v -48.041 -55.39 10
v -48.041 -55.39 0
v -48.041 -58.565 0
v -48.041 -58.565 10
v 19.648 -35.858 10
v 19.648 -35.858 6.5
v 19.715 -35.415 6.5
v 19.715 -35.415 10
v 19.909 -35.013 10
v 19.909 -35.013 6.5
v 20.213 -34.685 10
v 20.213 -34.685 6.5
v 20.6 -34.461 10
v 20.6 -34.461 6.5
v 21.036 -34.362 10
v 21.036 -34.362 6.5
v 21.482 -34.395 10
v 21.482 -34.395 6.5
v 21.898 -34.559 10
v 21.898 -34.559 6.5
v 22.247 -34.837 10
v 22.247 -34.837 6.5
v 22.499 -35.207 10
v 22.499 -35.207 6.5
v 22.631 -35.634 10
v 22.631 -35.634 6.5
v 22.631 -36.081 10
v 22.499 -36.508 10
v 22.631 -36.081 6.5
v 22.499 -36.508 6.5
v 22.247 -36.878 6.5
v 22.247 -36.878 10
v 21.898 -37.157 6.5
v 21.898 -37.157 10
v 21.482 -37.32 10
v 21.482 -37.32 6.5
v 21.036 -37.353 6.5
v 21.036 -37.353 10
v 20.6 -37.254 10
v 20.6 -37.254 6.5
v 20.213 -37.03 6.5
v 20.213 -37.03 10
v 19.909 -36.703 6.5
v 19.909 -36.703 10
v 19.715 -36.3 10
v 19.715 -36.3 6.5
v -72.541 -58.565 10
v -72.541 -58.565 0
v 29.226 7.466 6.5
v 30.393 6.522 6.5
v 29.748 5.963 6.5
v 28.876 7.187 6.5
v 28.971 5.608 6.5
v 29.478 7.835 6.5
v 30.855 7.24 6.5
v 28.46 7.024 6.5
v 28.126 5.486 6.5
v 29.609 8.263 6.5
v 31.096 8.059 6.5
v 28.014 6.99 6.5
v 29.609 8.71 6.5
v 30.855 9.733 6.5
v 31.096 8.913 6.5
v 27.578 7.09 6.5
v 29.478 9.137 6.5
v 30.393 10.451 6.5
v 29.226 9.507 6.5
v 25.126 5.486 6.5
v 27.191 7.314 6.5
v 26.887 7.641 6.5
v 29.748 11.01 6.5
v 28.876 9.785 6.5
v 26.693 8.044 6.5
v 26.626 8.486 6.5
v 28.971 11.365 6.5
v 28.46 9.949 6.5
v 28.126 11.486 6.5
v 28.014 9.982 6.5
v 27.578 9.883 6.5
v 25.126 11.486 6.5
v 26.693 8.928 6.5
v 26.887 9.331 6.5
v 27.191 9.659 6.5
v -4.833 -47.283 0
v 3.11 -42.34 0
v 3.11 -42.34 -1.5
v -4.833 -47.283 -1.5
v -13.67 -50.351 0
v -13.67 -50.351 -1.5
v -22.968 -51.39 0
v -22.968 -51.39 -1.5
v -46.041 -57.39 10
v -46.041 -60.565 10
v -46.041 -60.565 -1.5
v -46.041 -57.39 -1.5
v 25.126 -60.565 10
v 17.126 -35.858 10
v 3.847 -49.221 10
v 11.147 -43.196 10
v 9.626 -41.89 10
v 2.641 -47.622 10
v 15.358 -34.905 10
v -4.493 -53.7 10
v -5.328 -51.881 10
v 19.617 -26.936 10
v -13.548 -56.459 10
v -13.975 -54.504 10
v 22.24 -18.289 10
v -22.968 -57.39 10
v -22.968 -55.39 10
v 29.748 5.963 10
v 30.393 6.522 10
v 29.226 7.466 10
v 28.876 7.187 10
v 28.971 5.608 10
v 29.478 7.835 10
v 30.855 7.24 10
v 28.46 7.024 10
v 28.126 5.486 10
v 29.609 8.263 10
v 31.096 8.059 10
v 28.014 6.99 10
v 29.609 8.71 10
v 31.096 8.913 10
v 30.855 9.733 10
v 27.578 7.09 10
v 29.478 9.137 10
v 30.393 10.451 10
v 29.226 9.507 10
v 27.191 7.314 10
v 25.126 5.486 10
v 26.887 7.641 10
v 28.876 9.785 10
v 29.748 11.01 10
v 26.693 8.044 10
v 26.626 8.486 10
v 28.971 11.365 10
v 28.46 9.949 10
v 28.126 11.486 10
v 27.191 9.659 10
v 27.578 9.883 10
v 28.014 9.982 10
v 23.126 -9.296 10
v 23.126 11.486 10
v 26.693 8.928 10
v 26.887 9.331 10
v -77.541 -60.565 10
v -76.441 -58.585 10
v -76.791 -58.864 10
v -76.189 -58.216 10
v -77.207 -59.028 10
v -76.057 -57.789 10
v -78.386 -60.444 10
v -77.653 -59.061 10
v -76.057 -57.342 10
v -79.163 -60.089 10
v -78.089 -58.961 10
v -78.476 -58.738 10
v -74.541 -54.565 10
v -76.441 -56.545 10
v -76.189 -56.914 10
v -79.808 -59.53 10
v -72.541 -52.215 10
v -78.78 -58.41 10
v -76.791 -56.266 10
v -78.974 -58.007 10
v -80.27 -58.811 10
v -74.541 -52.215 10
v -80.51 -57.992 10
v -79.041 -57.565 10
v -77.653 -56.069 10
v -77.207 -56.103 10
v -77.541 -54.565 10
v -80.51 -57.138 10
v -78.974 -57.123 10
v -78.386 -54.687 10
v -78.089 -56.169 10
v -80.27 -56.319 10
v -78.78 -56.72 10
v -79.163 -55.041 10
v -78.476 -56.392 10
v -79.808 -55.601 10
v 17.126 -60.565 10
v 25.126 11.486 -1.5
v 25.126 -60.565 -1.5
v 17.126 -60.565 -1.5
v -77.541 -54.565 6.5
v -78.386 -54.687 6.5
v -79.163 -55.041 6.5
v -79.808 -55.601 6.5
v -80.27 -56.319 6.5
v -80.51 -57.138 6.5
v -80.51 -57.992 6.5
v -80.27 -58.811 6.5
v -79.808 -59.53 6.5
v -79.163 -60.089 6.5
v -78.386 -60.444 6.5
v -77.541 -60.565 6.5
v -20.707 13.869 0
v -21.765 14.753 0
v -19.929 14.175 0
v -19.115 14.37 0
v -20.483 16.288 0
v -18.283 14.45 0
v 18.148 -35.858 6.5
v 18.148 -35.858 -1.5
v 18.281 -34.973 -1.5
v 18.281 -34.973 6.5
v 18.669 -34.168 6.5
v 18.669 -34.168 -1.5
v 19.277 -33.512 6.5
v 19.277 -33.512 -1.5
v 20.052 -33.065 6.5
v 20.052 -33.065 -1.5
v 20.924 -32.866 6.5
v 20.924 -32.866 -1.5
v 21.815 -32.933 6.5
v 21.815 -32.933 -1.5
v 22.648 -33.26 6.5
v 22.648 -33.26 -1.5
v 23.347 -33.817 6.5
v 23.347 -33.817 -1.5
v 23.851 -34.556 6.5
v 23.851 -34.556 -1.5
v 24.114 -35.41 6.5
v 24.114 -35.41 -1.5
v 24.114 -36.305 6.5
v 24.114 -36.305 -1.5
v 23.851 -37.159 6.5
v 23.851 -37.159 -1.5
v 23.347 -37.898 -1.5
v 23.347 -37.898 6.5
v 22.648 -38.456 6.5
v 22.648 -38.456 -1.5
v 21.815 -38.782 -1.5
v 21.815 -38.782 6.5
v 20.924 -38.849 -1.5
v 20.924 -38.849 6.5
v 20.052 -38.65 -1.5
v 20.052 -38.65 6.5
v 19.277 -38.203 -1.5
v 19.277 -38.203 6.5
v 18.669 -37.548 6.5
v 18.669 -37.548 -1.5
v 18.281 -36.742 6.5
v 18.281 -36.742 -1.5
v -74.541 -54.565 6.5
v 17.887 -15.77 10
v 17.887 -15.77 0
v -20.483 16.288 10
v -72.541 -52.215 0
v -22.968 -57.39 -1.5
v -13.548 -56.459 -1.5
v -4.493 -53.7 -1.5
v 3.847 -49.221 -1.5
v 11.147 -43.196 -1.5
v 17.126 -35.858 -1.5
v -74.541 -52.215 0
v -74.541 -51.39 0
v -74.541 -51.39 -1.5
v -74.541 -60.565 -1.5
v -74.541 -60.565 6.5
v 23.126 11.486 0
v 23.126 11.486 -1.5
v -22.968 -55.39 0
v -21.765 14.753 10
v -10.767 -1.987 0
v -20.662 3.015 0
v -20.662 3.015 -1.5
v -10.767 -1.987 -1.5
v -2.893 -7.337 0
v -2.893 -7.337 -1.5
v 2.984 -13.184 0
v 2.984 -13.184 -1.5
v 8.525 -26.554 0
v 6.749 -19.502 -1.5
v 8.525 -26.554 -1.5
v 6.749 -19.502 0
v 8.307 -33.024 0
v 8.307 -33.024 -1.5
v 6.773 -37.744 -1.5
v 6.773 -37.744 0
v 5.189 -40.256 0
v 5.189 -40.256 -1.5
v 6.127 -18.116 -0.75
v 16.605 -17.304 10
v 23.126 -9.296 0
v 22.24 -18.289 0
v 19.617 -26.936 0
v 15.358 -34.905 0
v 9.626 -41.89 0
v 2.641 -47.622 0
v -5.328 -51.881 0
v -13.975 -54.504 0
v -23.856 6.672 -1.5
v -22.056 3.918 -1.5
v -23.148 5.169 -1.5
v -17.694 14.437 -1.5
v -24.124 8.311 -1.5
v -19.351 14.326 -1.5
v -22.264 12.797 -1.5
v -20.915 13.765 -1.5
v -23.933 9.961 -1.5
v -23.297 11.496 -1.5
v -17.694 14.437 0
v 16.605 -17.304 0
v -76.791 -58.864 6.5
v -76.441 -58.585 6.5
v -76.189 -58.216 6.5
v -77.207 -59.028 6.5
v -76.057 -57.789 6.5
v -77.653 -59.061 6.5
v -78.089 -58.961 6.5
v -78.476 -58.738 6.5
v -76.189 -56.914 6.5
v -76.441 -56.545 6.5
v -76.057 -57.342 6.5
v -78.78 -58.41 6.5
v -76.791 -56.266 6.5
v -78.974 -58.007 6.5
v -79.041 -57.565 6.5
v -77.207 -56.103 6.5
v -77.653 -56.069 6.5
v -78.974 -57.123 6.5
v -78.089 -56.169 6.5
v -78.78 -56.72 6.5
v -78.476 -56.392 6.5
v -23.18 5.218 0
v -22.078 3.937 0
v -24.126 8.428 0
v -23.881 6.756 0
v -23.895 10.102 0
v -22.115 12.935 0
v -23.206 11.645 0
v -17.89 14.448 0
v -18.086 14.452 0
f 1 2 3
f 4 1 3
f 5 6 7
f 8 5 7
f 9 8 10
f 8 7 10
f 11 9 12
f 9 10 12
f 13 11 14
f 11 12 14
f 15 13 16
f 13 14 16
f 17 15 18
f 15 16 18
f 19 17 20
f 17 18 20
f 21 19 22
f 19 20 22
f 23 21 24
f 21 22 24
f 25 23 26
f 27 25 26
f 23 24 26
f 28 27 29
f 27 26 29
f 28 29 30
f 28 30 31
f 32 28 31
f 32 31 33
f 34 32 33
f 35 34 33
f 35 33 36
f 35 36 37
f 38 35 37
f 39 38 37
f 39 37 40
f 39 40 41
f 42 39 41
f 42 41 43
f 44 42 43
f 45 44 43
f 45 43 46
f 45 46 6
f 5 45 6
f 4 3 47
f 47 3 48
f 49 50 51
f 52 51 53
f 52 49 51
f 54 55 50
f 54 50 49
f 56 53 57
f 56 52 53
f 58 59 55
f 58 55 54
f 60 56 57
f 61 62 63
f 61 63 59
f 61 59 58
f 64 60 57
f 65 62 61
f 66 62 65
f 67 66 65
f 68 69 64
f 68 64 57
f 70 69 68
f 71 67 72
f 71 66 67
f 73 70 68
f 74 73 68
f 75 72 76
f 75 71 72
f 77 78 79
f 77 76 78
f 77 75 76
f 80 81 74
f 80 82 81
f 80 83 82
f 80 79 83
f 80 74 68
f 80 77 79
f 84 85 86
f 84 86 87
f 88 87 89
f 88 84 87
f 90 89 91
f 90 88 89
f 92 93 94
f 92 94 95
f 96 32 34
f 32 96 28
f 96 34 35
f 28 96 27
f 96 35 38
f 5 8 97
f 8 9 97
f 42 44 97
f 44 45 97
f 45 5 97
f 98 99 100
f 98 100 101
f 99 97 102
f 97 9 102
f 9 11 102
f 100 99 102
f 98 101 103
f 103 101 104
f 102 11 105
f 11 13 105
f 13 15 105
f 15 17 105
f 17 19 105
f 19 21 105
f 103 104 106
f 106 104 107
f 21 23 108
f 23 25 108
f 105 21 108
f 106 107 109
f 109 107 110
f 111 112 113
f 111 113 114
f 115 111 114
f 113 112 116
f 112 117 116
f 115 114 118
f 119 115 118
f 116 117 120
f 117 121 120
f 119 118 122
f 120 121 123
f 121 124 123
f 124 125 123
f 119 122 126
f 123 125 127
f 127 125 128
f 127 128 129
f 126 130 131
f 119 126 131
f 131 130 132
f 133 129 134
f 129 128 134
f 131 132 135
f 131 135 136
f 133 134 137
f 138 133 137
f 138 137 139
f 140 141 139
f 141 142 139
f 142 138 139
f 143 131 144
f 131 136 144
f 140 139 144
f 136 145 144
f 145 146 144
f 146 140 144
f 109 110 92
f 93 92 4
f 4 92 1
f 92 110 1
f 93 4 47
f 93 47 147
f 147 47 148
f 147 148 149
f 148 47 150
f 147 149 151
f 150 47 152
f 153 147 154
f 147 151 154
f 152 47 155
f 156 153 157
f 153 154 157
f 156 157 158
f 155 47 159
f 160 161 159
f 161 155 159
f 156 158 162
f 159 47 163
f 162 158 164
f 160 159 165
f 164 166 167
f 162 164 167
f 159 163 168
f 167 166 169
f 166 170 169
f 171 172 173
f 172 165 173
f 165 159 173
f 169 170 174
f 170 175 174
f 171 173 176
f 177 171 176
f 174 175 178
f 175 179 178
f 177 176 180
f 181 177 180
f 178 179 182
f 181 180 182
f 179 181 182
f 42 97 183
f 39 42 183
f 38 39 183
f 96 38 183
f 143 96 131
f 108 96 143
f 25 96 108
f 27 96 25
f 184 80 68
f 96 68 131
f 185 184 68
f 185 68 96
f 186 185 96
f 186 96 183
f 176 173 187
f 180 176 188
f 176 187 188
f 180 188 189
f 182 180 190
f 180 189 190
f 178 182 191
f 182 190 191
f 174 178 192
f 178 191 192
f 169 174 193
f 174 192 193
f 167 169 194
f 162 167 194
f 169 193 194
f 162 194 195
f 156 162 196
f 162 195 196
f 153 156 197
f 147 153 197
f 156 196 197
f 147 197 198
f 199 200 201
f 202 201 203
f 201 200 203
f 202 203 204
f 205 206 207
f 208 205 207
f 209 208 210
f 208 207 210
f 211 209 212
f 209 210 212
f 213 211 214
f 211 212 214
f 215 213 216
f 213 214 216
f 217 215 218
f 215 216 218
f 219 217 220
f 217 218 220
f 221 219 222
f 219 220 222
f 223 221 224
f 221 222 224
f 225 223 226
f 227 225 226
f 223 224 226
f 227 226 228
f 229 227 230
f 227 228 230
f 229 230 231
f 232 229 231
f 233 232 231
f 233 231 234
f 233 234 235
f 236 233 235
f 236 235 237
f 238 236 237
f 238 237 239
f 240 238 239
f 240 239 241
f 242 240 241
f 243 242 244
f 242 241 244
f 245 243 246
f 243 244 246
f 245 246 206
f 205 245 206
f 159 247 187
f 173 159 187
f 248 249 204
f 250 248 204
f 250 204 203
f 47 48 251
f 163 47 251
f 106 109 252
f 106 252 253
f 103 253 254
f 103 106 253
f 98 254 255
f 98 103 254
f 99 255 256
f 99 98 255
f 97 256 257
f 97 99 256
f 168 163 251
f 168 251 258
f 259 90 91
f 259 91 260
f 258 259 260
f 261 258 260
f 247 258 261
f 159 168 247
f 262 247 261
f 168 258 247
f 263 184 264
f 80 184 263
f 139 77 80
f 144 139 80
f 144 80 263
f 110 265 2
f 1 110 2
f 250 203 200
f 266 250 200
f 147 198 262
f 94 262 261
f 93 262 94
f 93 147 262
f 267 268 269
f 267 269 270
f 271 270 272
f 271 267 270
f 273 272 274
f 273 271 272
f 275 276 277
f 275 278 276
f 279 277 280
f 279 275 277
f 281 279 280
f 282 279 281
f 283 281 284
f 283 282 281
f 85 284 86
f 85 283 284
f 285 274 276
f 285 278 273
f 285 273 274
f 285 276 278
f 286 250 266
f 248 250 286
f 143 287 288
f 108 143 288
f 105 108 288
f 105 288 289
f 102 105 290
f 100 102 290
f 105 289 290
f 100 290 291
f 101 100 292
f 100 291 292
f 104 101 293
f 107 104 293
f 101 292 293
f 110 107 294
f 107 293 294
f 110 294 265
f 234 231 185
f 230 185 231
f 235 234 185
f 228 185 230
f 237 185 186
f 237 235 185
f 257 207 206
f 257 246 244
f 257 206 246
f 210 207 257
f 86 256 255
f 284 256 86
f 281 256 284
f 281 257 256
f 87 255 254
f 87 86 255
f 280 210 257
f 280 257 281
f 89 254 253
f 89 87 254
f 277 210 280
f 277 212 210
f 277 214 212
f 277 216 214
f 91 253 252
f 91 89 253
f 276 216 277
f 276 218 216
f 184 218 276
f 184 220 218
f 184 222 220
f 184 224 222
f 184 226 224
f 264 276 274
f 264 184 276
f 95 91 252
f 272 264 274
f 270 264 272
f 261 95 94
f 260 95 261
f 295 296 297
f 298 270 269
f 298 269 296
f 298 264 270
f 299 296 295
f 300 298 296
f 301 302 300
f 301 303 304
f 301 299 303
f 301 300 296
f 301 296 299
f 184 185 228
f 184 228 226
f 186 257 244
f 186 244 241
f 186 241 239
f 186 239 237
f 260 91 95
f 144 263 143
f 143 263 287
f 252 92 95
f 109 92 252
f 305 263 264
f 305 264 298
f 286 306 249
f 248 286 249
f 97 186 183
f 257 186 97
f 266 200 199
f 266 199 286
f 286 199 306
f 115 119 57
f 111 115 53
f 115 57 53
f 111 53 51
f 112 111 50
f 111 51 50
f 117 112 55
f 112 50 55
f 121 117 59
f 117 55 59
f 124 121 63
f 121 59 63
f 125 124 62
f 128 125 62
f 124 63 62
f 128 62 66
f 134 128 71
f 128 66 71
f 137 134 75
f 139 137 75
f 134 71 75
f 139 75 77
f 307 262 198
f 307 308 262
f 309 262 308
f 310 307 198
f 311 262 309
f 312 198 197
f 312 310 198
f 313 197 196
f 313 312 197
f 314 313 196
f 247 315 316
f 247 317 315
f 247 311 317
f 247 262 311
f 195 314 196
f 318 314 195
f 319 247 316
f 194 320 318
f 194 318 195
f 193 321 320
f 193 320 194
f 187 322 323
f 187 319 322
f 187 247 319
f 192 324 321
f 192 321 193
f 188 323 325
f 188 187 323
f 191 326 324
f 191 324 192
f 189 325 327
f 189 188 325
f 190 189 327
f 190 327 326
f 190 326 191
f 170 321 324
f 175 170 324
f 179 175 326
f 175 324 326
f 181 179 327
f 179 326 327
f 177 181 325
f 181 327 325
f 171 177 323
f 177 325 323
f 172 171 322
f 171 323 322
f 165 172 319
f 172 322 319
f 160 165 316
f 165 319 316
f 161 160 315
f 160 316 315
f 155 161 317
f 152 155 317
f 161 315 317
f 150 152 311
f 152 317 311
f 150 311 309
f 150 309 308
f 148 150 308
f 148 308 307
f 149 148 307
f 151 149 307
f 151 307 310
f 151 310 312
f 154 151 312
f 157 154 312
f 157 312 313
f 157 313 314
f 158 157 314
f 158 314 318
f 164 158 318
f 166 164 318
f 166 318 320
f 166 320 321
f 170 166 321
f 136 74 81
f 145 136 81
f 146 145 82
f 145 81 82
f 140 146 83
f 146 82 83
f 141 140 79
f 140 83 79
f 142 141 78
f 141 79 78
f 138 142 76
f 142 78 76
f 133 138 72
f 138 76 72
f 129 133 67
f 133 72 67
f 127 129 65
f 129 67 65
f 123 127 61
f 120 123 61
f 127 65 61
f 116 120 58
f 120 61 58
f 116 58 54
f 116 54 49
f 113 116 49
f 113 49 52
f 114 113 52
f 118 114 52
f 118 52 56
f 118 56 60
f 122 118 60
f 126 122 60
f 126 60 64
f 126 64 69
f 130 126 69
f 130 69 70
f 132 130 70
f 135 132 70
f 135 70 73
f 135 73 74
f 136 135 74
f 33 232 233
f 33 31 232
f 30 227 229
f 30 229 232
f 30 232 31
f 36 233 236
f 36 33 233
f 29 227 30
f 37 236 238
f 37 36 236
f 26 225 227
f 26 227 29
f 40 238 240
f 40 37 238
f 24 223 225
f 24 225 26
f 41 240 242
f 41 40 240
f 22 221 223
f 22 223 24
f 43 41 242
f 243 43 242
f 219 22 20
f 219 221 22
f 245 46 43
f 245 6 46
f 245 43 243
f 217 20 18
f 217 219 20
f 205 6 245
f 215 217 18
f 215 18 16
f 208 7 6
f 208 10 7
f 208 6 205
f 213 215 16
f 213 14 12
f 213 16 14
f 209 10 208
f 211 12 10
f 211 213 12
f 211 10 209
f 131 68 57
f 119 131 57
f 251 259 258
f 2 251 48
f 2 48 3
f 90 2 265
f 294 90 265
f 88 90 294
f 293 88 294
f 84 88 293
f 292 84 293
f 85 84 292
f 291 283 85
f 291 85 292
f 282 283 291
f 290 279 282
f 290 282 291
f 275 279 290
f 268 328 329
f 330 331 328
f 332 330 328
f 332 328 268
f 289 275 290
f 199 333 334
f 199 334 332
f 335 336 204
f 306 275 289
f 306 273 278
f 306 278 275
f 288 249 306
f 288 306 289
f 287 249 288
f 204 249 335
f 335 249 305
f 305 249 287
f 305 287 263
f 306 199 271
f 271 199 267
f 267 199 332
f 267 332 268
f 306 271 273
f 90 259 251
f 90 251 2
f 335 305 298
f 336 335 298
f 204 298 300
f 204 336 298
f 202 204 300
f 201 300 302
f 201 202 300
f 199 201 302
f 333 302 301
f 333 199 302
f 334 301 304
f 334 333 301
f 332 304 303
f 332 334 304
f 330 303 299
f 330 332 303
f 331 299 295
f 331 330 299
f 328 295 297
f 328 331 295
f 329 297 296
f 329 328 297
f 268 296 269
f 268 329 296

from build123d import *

# Parameters (mm, degrees)
BOSS_EXTRUDE1_DEPTH = 10
BOSS_EXTRUDE2_DEPTH = 1.5
BOSS_EXTRUDE4_DEPTH = 10
SKETCH4_R           = 1.5
BOSS_EXTRUDE3_DEPTH = 11.5
SKETCH5_R           = 1.5
SKETCH5_R_2         = 3
CUT_EXTRUDE1_DEPTH  = 8


with BuildPart() as part:
    # Sketch1 → Boss-Extrude1 (new body)
    with BuildSketch(Plane.XY):
        with BuildLine():
            Line((23.126155741, 11.486298975), (23.126155741, -9.296311409))
            ThreePointArc((23.126155741, -9.296311409), (9.625591469, -41.889556774), (-22.967653896, -55.390121046))
            Line((-22.967653896, -55.390121046), (-48.04069211, -55.390121046))
            Line((-48.04069211, -55.390121046), (-48.04069211, -58.565121046))
            Line((-48.04069211, -58.565121046), (-72.54069211, -58.565121046))
            Line((-72.54069211, -58.565121046), (-72.54069211, -52.215121046))
            Line((-72.54069211, -52.215121046), (-74.54069211, -52.215121046))
            Line((-74.54069211, -52.215121046), (-74.54069211, -60.565121046))
            Line((-74.54069211, -60.565121046), (-46.04069211, -60.565121046))
            Line((-46.04069211, -60.565121046), (-46.04069211, -57.390121046))
            Line((-46.04069211, -57.390121046), (-22.967653896, -57.390121046))
            ThreePointArc((-22.967653896, -57.390121046), (11.039805031, -43.303770336), (25.126155741, -9.296311409))
            Line((25.126155741, -9.296311409), (25.126155741, 11.486298975))
            Line((25.126155741, 11.486298975), (23.126155741, 11.486298975))
        make_face()
    extrude(amount=BOSS_EXTRUDE1_DEPTH)

    # Sketch2 → Boss-Extrude2 (add)
    with BuildSketch(Plane(origin=(0, 0, 0), x_dir=(-1, 0, 0), z_dir=(0, 0, -1))):
        with BuildLine():
            Line((-23.126155741, 11.486298975), (17.693603893, 14.436753165))
            ThreePointArc((17.693603893, 14.436753165), (23.933278885, 9.961444684), (20.661865311, 3.014518513))
            add(Edge.make_bspline(
                [(20.661865311, 3.014518513), (14.467019278, 0.125814366), (-11.141513341, -11.233209967), (-9.492969782, -37.302039453), (-3.109665986, -42.33964958)],
                knots=[0, 0, 0, 0, 0.582936219, 1, 1, 1, 1], degree=3))
            ThreePointArc((-3.109665986, -42.33964958), (9.166044877, -49.06318705), (22.967653896, -51.390121046))
            Line((22.967653896, -51.390121046), (52.04069211, -51.390121046))
            Line((52.04069211, -51.390121046), (74.54069211, -51.390121046))
            Line((74.54069211, -51.390121046), (74.54069211, -52.215121046))
            Line((74.54069211, -52.215121046), (74.54069211, -60.565121046))
            Line((74.54069211, -60.565121046), (46.04069211, -60.565121046))
            Line((46.04069211, -60.565121046), (46.04069211, -57.390121046))
            Line((46.04069211, -57.390121046), (22.967653896, -57.390121046))
            ThreePointArc((22.967653896, -57.390121046), (-11.039805031, -43.303770336), (-25.126155741, -9.296311409))
            Line((-25.126155741, -9.296311409), (-25.126155741, 11.486298975))
            Line((-25.126155741, 11.486298975), (-23.126155741, 11.486298975))
        make_face()
    extrude(amount=BOSS_EXTRUDE2_DEPTH)

    # Sketch6 → Boss-Extrude4 (add)
    with BuildSketch(Plane.XY):
        Polygon((-21.765334092, 14.753493125), (16.605109206, -17.304408883), (17.887425286, -15.769591151), (-20.483018011, 16.288310857), align=None)
    extrude(amount=BOSS_EXTRUDE4_DEPTH)

    # Sketch4 → Boss-Extrude3 (add)
    with BuildSketch(Plane(origin=(0, 0, -1.5), x_dir=(-1, 0, 0), z_dir=(0, 0, -1))):
        with BuildLine():
            Line((-25.126155741, -9.296311409), (-25.126155741, -60.565121046))
            Line((-25.126155741, -60.565121046), (-17.126155741, -60.565121046))
            Line((-17.126155741, -60.565121046), (-17.126155741, -35.857579341))
            ThreePointArc((-17.126155741, -35.857579341), (-23.082745525, -23.166251515), (-25.126155741, -9.296311409))
        make_face()
        with Locations((-21.147916143, -35.857579341)):
            Circle(SKETCH4_R, mode=Mode.SUBTRACT)
        with BuildLine():
            Line((-28.126155741, 11.486298975), (-25.126155741, 11.486298975))
            Line((-25.126155741, 11.486298975), (-25.126155741, 5.486298975))
            Line((-25.126155741, 5.486298975), (-28.126155741, 5.486298975))
            ThreePointArc((-28.126155741, 5.486298975), (-31.126155741, 8.486298975), (-28.126155741, 11.486298975))
        make_face()
        with Locations((-28.126155741, 8.486298975)):
            Circle(SKETCH4_R, mode=Mode.SUBTRACT)
        with BuildLine():
            Line((74.54069211, -60.565121046), (74.54069211, -54.565121046))
            Line((74.54069211, -54.565121046), (77.54069211, -54.565121046))
            ThreePointArc((77.54069211, -54.565121046), (80.54069211, -57.565121046), (77.54069211, -60.565121046))
            Line((77.54069211, -60.565121046), (74.54069211, -60.565121046))
        make_face()
        with Locations((77.54069211, -57.565121046)):
            Circle(SKETCH4_R, mode=Mode.SUBTRACT)
    extrude(amount=-BOSS_EXTRUDE3_DEPTH)

    # Sketch5 → Cut-Extrude1 (cut)
    with BuildSketch(Plane(origin=(0, 0, -1.5), x_dir=(-1, 0, 0), z_dir=(0, 0, -1))):
        with BuildLine():
            Line((77.54069211, -54.565121046), (74.54069211, -54.565121046))
            Line((74.54069211, -54.565121046), (74.54069211, -60.565121046))
            Line((74.54069211, -60.565121046), (77.54069211, -60.565121046))
            ThreePointArc((77.54069211, -60.565121046), (80.54069211, -57.565121046), (77.54069211, -54.565121046))
        make_face()
        with Locations((77.54069211, -57.565121046)):
            Circle(SKETCH5_R, mode=Mode.SUBTRACT)
        with Locations((-21.147916143, -35.857579341)):
            Circle(SKETCH5_R_2)
        with Locations((-21.147916143, -35.857579341)):
            Circle(SKETCH5_R, mode=Mode.SUBTRACT)
        with BuildLine():
            Line((-28.126155741, 5.486298975), (-25.126155741, 5.486298975))
            Line((-25.126155741, 5.486298975), (-25.126155741, 11.486298975))
            Line((-25.126155741, 11.486298975), (-28.126155741, 11.486298975))
            ThreePointArc((-28.126155741, 11.486298975), (-31.126155741, 8.486298975), (-28.126155741, 5.486298975))
        make_face()
        with Locations((-28.126155741, 8.486298975)):
            Circle(SKETCH5_R, mode=Mode.SUBTRACT)
    extrude(amount=-CUT_EXTRUDE1_DEPTH, mode=Mode.SUBTRACT)


solid = part.part
